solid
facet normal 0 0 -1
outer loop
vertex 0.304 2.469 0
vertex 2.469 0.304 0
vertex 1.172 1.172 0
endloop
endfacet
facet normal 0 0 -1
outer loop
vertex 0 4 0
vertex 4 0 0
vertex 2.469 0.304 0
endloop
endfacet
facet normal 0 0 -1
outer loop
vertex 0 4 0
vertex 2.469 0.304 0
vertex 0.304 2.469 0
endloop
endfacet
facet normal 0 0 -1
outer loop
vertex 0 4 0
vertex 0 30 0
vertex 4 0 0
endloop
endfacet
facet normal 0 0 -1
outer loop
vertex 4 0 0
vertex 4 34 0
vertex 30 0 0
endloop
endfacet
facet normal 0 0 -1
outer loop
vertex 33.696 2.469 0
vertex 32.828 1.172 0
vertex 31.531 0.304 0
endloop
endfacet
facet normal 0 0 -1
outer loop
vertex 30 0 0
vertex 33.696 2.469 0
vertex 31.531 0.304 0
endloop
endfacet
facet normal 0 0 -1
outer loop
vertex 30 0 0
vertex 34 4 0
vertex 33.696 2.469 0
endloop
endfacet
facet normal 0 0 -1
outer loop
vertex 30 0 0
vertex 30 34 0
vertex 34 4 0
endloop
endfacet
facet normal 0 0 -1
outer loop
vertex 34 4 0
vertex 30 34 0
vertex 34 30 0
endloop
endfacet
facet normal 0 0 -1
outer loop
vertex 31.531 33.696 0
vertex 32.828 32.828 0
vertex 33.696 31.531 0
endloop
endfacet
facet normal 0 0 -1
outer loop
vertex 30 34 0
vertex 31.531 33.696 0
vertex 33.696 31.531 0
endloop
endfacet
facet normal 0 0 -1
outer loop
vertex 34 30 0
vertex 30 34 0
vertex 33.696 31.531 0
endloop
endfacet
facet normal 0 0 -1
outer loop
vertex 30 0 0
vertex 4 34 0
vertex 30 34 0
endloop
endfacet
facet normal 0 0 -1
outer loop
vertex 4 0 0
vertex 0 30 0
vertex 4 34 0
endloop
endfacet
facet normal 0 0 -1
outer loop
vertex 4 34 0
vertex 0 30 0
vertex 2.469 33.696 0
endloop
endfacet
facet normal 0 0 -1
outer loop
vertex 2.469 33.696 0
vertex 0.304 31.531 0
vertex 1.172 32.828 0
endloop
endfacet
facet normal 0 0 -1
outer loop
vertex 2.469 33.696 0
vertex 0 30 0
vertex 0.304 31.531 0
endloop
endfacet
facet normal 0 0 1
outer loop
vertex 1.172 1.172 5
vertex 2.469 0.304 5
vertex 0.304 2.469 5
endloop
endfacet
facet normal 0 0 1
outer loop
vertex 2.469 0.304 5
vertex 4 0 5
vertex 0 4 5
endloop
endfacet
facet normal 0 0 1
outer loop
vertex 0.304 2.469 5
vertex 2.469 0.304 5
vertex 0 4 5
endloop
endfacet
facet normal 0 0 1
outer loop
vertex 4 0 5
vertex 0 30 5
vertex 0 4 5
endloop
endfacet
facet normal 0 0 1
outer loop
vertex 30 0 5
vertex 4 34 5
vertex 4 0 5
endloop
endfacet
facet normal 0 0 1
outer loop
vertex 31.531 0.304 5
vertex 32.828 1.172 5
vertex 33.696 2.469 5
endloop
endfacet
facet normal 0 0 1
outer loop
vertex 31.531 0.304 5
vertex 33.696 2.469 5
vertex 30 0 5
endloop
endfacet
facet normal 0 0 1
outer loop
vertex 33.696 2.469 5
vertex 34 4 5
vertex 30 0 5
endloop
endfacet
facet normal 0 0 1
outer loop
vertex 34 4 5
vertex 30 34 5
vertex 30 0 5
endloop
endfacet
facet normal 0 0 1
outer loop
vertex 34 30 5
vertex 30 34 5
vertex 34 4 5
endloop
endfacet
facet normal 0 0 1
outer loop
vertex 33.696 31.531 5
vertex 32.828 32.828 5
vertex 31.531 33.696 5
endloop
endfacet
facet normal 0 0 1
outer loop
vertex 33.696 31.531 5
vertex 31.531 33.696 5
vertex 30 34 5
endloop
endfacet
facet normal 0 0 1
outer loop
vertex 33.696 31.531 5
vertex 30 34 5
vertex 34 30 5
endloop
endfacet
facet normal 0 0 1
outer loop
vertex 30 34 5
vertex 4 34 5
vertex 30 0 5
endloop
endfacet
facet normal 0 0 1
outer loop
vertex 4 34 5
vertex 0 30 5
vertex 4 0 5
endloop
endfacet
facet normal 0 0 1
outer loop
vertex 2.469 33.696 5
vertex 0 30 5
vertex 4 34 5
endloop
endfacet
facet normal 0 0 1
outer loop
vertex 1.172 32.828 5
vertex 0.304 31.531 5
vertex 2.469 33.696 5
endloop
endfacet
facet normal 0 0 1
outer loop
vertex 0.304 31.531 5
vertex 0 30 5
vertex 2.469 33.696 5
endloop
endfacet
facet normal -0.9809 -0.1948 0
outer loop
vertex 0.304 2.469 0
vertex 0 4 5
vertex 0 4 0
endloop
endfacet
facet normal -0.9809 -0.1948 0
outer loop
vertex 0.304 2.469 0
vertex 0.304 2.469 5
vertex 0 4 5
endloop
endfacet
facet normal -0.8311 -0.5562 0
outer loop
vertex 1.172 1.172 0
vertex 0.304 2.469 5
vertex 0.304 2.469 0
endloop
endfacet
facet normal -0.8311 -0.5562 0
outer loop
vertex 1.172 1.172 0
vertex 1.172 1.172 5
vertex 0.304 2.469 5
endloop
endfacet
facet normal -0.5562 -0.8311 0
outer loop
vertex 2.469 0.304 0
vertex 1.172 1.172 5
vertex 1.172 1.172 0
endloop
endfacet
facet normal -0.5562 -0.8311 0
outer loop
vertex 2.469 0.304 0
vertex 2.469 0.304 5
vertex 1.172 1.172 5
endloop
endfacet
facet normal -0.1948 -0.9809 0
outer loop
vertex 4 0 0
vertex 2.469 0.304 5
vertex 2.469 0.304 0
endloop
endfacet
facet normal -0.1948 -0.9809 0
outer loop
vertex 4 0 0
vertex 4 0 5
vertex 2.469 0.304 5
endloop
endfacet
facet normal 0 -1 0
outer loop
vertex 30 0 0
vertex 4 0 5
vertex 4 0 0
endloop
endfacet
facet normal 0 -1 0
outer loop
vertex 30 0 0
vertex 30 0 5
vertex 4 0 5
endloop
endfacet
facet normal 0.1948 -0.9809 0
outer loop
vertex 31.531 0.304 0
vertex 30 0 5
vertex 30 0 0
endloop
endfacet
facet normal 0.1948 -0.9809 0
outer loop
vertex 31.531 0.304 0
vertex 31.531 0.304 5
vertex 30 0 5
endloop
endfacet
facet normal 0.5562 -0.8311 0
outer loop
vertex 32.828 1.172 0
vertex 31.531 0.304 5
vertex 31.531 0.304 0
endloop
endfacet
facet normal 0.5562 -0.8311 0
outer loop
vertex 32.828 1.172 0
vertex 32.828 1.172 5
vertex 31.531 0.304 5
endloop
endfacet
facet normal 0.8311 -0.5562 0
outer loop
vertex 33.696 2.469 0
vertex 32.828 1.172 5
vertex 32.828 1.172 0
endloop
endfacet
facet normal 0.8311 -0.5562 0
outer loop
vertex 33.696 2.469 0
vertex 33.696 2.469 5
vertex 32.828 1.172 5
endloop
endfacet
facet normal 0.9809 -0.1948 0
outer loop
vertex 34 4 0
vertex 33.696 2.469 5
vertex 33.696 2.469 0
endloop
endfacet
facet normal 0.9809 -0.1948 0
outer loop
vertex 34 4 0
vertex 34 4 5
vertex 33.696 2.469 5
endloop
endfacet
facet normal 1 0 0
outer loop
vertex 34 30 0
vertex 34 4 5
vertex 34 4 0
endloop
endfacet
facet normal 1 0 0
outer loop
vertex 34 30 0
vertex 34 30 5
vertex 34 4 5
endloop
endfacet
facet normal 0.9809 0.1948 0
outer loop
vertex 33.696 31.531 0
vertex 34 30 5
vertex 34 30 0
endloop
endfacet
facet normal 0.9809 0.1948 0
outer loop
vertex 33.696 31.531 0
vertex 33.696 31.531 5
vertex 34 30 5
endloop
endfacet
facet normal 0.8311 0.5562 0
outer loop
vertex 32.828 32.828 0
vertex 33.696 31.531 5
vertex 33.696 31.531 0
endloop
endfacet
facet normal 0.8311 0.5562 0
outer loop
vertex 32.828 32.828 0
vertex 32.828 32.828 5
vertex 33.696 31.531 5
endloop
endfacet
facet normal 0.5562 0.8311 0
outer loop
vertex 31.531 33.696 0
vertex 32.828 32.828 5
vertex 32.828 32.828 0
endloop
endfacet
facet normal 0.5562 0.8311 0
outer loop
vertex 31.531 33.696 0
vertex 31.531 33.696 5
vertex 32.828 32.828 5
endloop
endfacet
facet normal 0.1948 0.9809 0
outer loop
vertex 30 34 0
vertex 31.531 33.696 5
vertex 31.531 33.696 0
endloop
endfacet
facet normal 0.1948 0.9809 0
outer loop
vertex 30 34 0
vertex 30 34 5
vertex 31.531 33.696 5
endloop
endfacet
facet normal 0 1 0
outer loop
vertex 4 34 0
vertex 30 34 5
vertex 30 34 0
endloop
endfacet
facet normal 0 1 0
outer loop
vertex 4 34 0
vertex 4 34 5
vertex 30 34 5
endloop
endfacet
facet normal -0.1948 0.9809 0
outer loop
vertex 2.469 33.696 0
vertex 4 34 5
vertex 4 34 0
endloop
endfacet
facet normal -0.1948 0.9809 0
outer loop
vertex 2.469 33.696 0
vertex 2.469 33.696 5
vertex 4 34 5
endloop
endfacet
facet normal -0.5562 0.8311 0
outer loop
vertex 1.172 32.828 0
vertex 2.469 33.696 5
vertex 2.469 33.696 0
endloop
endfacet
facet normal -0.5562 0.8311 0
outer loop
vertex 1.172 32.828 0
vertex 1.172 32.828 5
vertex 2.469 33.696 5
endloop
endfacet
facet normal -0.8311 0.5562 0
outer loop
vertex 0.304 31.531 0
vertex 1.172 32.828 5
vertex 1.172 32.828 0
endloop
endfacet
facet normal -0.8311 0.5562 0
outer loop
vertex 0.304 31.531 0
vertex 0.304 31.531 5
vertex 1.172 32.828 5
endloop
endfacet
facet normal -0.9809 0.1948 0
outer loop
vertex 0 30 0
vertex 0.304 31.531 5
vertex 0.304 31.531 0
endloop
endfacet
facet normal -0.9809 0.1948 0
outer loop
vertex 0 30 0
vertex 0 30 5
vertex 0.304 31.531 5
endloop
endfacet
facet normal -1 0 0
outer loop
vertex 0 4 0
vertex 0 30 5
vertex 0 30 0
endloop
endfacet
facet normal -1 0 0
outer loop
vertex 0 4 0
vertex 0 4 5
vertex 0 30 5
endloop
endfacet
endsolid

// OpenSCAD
// file: roundedsquare.scad
module roundedSquare(size=[10,10], radius=1, center=false, $fn=16) {
    size1 = (size+0==size) ? [size,size] : size;
    if (radius <= 0) {
        square(size1, center=center);
    }
    else {
        translate(center ? -size1/2 : [0,0])
        hull() {
            translate([radius,radius]) circle(r=radius);
            translate([size1[0]-radius,radius]) circle(r=radius);
            translate([size1[0]-radius,size1[1]-radius]) circle(r=radius);
            translate([radius,size1[1]-radius]) circle(r=radius);
        }
    }
}

module roundedCube(size=[10,10,10], radius=1, center=false, $fn=16) {
    linear_extrude(height=size[2])
    roundedSquare(size=[size[0],size[1]], radius=radius, center=center);
}

module roundedOpenTopBox(size=[10,10,10], radius=2, wall=1, solid=false) {
    render(convexity=2)
    difference() {
        linear_extrude(height=size[2]) roundedSquare(size=[size[0],size[1]], radius=radius);
        if (!solid) {
            translate([0,0,wall])
            linear_extrude(height=size[2]-wall) 
            translate([wall,wall]) roundedSquare(size=[size[0]-2*wall,size[1]-2*wall], radius=radius-wall);
        }
    }
}
// main file
use <roundedsquare.scad>;

w=34;
rounded=4;
h=5;

$fn = 16;
linear_extrude(height=h) roundedSquare(w, radius=rounded);
